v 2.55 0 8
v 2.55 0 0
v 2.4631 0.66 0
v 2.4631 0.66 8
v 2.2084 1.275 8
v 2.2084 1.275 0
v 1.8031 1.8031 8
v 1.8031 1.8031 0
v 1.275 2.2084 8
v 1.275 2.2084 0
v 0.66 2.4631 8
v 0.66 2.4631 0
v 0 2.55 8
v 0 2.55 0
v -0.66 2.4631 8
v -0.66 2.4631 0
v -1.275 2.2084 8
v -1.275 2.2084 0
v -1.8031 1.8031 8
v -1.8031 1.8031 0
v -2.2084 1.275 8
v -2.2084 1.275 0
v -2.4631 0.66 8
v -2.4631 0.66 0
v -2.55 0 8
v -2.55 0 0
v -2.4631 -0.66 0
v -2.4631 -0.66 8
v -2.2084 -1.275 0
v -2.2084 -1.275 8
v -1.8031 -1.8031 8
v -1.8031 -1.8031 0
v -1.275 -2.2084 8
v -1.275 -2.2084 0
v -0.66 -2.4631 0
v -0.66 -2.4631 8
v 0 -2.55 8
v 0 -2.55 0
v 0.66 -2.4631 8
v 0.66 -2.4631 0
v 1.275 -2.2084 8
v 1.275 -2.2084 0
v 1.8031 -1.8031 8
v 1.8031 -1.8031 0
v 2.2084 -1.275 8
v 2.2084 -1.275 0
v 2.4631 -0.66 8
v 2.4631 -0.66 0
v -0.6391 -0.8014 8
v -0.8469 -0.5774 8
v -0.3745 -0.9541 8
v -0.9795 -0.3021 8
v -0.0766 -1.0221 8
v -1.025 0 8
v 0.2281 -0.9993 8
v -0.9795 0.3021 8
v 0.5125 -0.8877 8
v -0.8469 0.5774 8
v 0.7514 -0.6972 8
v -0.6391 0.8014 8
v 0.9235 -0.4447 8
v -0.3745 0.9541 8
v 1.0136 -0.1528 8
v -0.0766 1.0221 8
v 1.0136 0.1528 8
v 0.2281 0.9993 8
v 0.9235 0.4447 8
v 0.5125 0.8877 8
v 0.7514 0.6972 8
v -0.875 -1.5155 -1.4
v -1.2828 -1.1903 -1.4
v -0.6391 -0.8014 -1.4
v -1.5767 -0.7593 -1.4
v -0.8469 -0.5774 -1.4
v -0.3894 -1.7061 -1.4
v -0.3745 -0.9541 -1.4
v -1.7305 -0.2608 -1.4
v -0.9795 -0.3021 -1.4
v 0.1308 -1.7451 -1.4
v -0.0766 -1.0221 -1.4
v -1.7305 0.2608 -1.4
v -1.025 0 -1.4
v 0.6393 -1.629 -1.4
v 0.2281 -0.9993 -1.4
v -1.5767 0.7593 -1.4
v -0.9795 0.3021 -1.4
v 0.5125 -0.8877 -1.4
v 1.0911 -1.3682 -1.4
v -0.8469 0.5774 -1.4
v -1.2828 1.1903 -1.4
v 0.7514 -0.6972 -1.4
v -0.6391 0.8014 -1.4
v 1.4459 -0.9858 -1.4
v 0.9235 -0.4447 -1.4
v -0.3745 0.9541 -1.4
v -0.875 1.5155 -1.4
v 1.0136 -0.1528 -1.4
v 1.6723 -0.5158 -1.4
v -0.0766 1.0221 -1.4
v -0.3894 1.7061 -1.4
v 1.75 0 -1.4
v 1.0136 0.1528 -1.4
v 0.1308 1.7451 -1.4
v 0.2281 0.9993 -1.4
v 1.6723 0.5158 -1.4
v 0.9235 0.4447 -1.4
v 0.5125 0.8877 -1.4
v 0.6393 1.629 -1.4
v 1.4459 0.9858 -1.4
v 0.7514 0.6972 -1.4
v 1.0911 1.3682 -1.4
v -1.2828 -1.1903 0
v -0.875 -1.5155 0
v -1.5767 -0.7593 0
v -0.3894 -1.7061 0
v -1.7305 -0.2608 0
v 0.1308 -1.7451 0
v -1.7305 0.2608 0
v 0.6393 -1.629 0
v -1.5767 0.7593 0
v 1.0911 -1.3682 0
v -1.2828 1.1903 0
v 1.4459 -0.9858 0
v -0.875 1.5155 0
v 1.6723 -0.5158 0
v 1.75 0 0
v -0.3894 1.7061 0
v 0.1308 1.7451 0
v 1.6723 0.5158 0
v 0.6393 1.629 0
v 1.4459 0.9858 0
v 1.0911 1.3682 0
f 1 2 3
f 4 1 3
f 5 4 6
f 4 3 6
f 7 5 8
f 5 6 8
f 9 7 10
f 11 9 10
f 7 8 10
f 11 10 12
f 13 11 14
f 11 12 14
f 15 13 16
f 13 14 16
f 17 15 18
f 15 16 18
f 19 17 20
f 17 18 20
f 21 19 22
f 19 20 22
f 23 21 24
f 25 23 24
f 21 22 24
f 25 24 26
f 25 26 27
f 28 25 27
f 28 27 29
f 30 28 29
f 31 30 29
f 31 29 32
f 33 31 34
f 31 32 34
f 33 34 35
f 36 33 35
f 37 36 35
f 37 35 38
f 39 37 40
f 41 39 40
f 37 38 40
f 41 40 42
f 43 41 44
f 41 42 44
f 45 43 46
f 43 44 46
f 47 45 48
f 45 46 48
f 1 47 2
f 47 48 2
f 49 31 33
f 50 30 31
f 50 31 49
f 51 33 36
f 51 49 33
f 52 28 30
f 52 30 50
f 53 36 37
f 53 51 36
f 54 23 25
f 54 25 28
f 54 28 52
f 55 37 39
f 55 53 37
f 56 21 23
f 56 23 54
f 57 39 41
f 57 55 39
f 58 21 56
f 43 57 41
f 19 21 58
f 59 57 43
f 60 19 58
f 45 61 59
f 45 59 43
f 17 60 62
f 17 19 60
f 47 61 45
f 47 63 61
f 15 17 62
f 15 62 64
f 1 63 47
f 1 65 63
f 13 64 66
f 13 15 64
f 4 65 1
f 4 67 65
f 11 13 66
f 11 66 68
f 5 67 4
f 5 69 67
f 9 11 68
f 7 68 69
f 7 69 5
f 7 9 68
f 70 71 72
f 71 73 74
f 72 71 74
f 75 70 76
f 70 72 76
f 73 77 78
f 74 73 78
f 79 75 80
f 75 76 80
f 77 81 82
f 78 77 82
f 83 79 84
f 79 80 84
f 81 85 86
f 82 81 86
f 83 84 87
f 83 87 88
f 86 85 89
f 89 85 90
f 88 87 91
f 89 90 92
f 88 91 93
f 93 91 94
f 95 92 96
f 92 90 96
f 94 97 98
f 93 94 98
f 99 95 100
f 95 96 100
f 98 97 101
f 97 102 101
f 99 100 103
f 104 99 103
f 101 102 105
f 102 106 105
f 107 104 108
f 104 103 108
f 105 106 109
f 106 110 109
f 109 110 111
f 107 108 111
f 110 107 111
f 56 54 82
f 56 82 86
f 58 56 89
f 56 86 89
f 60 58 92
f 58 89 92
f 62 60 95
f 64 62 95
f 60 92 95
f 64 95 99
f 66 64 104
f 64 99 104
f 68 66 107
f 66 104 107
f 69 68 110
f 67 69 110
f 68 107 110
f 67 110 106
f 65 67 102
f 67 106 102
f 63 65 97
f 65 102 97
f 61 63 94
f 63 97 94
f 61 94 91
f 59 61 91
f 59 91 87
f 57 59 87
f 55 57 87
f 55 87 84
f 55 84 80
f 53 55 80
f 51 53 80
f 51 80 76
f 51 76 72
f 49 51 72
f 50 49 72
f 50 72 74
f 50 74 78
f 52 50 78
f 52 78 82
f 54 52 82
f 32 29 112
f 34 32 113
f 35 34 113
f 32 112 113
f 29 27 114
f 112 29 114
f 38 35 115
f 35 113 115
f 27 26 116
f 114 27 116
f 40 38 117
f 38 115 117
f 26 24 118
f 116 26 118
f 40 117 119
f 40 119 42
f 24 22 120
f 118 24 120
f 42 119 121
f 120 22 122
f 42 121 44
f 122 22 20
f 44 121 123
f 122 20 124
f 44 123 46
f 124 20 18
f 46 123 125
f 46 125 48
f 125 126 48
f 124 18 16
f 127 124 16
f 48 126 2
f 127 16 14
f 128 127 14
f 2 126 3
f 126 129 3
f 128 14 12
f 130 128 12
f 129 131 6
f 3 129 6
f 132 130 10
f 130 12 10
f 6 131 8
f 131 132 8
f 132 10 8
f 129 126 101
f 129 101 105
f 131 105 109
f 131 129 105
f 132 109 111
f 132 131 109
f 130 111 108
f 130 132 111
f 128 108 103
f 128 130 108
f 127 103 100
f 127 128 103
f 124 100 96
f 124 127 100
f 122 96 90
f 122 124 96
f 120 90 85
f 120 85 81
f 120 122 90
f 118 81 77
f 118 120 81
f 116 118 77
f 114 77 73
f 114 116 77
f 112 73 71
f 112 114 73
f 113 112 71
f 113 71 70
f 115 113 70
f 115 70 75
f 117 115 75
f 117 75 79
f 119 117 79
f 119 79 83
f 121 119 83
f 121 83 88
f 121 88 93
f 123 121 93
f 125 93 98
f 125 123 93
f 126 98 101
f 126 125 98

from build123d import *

# Parameters (mm, degrees)
MAIN_FEATURES_R          = 2.55
BODY_DEPTH               = 8
SKETCH1_3_R              = 1.75
PEG_DEPTH                = 1.4
M2_5X0_45_TAPPED_HOLE1_D = 2.05


with BuildPart() as part:
    # main_features → body (new body)
    with BuildSketch(Plane.XY):
        Circle(MAIN_FEATURES_R)
    extrude(amount=BODY_DEPTH)

    # Sketch1<3> → peg (add)
    with BuildSketch(Plane.XY):
        Circle(SKETCH1_3_R)
    extrude(amount=-PEG_DEPTH)

    # M2.5x0.45 Tapped Hole1 (through all)
    with Locations(Plane.XY.offset(8)):
        with Locations((0, 0)):
            Hole(M2_5X0_45_TAPPED_HOLE1_D / 2)


solid = part.part
